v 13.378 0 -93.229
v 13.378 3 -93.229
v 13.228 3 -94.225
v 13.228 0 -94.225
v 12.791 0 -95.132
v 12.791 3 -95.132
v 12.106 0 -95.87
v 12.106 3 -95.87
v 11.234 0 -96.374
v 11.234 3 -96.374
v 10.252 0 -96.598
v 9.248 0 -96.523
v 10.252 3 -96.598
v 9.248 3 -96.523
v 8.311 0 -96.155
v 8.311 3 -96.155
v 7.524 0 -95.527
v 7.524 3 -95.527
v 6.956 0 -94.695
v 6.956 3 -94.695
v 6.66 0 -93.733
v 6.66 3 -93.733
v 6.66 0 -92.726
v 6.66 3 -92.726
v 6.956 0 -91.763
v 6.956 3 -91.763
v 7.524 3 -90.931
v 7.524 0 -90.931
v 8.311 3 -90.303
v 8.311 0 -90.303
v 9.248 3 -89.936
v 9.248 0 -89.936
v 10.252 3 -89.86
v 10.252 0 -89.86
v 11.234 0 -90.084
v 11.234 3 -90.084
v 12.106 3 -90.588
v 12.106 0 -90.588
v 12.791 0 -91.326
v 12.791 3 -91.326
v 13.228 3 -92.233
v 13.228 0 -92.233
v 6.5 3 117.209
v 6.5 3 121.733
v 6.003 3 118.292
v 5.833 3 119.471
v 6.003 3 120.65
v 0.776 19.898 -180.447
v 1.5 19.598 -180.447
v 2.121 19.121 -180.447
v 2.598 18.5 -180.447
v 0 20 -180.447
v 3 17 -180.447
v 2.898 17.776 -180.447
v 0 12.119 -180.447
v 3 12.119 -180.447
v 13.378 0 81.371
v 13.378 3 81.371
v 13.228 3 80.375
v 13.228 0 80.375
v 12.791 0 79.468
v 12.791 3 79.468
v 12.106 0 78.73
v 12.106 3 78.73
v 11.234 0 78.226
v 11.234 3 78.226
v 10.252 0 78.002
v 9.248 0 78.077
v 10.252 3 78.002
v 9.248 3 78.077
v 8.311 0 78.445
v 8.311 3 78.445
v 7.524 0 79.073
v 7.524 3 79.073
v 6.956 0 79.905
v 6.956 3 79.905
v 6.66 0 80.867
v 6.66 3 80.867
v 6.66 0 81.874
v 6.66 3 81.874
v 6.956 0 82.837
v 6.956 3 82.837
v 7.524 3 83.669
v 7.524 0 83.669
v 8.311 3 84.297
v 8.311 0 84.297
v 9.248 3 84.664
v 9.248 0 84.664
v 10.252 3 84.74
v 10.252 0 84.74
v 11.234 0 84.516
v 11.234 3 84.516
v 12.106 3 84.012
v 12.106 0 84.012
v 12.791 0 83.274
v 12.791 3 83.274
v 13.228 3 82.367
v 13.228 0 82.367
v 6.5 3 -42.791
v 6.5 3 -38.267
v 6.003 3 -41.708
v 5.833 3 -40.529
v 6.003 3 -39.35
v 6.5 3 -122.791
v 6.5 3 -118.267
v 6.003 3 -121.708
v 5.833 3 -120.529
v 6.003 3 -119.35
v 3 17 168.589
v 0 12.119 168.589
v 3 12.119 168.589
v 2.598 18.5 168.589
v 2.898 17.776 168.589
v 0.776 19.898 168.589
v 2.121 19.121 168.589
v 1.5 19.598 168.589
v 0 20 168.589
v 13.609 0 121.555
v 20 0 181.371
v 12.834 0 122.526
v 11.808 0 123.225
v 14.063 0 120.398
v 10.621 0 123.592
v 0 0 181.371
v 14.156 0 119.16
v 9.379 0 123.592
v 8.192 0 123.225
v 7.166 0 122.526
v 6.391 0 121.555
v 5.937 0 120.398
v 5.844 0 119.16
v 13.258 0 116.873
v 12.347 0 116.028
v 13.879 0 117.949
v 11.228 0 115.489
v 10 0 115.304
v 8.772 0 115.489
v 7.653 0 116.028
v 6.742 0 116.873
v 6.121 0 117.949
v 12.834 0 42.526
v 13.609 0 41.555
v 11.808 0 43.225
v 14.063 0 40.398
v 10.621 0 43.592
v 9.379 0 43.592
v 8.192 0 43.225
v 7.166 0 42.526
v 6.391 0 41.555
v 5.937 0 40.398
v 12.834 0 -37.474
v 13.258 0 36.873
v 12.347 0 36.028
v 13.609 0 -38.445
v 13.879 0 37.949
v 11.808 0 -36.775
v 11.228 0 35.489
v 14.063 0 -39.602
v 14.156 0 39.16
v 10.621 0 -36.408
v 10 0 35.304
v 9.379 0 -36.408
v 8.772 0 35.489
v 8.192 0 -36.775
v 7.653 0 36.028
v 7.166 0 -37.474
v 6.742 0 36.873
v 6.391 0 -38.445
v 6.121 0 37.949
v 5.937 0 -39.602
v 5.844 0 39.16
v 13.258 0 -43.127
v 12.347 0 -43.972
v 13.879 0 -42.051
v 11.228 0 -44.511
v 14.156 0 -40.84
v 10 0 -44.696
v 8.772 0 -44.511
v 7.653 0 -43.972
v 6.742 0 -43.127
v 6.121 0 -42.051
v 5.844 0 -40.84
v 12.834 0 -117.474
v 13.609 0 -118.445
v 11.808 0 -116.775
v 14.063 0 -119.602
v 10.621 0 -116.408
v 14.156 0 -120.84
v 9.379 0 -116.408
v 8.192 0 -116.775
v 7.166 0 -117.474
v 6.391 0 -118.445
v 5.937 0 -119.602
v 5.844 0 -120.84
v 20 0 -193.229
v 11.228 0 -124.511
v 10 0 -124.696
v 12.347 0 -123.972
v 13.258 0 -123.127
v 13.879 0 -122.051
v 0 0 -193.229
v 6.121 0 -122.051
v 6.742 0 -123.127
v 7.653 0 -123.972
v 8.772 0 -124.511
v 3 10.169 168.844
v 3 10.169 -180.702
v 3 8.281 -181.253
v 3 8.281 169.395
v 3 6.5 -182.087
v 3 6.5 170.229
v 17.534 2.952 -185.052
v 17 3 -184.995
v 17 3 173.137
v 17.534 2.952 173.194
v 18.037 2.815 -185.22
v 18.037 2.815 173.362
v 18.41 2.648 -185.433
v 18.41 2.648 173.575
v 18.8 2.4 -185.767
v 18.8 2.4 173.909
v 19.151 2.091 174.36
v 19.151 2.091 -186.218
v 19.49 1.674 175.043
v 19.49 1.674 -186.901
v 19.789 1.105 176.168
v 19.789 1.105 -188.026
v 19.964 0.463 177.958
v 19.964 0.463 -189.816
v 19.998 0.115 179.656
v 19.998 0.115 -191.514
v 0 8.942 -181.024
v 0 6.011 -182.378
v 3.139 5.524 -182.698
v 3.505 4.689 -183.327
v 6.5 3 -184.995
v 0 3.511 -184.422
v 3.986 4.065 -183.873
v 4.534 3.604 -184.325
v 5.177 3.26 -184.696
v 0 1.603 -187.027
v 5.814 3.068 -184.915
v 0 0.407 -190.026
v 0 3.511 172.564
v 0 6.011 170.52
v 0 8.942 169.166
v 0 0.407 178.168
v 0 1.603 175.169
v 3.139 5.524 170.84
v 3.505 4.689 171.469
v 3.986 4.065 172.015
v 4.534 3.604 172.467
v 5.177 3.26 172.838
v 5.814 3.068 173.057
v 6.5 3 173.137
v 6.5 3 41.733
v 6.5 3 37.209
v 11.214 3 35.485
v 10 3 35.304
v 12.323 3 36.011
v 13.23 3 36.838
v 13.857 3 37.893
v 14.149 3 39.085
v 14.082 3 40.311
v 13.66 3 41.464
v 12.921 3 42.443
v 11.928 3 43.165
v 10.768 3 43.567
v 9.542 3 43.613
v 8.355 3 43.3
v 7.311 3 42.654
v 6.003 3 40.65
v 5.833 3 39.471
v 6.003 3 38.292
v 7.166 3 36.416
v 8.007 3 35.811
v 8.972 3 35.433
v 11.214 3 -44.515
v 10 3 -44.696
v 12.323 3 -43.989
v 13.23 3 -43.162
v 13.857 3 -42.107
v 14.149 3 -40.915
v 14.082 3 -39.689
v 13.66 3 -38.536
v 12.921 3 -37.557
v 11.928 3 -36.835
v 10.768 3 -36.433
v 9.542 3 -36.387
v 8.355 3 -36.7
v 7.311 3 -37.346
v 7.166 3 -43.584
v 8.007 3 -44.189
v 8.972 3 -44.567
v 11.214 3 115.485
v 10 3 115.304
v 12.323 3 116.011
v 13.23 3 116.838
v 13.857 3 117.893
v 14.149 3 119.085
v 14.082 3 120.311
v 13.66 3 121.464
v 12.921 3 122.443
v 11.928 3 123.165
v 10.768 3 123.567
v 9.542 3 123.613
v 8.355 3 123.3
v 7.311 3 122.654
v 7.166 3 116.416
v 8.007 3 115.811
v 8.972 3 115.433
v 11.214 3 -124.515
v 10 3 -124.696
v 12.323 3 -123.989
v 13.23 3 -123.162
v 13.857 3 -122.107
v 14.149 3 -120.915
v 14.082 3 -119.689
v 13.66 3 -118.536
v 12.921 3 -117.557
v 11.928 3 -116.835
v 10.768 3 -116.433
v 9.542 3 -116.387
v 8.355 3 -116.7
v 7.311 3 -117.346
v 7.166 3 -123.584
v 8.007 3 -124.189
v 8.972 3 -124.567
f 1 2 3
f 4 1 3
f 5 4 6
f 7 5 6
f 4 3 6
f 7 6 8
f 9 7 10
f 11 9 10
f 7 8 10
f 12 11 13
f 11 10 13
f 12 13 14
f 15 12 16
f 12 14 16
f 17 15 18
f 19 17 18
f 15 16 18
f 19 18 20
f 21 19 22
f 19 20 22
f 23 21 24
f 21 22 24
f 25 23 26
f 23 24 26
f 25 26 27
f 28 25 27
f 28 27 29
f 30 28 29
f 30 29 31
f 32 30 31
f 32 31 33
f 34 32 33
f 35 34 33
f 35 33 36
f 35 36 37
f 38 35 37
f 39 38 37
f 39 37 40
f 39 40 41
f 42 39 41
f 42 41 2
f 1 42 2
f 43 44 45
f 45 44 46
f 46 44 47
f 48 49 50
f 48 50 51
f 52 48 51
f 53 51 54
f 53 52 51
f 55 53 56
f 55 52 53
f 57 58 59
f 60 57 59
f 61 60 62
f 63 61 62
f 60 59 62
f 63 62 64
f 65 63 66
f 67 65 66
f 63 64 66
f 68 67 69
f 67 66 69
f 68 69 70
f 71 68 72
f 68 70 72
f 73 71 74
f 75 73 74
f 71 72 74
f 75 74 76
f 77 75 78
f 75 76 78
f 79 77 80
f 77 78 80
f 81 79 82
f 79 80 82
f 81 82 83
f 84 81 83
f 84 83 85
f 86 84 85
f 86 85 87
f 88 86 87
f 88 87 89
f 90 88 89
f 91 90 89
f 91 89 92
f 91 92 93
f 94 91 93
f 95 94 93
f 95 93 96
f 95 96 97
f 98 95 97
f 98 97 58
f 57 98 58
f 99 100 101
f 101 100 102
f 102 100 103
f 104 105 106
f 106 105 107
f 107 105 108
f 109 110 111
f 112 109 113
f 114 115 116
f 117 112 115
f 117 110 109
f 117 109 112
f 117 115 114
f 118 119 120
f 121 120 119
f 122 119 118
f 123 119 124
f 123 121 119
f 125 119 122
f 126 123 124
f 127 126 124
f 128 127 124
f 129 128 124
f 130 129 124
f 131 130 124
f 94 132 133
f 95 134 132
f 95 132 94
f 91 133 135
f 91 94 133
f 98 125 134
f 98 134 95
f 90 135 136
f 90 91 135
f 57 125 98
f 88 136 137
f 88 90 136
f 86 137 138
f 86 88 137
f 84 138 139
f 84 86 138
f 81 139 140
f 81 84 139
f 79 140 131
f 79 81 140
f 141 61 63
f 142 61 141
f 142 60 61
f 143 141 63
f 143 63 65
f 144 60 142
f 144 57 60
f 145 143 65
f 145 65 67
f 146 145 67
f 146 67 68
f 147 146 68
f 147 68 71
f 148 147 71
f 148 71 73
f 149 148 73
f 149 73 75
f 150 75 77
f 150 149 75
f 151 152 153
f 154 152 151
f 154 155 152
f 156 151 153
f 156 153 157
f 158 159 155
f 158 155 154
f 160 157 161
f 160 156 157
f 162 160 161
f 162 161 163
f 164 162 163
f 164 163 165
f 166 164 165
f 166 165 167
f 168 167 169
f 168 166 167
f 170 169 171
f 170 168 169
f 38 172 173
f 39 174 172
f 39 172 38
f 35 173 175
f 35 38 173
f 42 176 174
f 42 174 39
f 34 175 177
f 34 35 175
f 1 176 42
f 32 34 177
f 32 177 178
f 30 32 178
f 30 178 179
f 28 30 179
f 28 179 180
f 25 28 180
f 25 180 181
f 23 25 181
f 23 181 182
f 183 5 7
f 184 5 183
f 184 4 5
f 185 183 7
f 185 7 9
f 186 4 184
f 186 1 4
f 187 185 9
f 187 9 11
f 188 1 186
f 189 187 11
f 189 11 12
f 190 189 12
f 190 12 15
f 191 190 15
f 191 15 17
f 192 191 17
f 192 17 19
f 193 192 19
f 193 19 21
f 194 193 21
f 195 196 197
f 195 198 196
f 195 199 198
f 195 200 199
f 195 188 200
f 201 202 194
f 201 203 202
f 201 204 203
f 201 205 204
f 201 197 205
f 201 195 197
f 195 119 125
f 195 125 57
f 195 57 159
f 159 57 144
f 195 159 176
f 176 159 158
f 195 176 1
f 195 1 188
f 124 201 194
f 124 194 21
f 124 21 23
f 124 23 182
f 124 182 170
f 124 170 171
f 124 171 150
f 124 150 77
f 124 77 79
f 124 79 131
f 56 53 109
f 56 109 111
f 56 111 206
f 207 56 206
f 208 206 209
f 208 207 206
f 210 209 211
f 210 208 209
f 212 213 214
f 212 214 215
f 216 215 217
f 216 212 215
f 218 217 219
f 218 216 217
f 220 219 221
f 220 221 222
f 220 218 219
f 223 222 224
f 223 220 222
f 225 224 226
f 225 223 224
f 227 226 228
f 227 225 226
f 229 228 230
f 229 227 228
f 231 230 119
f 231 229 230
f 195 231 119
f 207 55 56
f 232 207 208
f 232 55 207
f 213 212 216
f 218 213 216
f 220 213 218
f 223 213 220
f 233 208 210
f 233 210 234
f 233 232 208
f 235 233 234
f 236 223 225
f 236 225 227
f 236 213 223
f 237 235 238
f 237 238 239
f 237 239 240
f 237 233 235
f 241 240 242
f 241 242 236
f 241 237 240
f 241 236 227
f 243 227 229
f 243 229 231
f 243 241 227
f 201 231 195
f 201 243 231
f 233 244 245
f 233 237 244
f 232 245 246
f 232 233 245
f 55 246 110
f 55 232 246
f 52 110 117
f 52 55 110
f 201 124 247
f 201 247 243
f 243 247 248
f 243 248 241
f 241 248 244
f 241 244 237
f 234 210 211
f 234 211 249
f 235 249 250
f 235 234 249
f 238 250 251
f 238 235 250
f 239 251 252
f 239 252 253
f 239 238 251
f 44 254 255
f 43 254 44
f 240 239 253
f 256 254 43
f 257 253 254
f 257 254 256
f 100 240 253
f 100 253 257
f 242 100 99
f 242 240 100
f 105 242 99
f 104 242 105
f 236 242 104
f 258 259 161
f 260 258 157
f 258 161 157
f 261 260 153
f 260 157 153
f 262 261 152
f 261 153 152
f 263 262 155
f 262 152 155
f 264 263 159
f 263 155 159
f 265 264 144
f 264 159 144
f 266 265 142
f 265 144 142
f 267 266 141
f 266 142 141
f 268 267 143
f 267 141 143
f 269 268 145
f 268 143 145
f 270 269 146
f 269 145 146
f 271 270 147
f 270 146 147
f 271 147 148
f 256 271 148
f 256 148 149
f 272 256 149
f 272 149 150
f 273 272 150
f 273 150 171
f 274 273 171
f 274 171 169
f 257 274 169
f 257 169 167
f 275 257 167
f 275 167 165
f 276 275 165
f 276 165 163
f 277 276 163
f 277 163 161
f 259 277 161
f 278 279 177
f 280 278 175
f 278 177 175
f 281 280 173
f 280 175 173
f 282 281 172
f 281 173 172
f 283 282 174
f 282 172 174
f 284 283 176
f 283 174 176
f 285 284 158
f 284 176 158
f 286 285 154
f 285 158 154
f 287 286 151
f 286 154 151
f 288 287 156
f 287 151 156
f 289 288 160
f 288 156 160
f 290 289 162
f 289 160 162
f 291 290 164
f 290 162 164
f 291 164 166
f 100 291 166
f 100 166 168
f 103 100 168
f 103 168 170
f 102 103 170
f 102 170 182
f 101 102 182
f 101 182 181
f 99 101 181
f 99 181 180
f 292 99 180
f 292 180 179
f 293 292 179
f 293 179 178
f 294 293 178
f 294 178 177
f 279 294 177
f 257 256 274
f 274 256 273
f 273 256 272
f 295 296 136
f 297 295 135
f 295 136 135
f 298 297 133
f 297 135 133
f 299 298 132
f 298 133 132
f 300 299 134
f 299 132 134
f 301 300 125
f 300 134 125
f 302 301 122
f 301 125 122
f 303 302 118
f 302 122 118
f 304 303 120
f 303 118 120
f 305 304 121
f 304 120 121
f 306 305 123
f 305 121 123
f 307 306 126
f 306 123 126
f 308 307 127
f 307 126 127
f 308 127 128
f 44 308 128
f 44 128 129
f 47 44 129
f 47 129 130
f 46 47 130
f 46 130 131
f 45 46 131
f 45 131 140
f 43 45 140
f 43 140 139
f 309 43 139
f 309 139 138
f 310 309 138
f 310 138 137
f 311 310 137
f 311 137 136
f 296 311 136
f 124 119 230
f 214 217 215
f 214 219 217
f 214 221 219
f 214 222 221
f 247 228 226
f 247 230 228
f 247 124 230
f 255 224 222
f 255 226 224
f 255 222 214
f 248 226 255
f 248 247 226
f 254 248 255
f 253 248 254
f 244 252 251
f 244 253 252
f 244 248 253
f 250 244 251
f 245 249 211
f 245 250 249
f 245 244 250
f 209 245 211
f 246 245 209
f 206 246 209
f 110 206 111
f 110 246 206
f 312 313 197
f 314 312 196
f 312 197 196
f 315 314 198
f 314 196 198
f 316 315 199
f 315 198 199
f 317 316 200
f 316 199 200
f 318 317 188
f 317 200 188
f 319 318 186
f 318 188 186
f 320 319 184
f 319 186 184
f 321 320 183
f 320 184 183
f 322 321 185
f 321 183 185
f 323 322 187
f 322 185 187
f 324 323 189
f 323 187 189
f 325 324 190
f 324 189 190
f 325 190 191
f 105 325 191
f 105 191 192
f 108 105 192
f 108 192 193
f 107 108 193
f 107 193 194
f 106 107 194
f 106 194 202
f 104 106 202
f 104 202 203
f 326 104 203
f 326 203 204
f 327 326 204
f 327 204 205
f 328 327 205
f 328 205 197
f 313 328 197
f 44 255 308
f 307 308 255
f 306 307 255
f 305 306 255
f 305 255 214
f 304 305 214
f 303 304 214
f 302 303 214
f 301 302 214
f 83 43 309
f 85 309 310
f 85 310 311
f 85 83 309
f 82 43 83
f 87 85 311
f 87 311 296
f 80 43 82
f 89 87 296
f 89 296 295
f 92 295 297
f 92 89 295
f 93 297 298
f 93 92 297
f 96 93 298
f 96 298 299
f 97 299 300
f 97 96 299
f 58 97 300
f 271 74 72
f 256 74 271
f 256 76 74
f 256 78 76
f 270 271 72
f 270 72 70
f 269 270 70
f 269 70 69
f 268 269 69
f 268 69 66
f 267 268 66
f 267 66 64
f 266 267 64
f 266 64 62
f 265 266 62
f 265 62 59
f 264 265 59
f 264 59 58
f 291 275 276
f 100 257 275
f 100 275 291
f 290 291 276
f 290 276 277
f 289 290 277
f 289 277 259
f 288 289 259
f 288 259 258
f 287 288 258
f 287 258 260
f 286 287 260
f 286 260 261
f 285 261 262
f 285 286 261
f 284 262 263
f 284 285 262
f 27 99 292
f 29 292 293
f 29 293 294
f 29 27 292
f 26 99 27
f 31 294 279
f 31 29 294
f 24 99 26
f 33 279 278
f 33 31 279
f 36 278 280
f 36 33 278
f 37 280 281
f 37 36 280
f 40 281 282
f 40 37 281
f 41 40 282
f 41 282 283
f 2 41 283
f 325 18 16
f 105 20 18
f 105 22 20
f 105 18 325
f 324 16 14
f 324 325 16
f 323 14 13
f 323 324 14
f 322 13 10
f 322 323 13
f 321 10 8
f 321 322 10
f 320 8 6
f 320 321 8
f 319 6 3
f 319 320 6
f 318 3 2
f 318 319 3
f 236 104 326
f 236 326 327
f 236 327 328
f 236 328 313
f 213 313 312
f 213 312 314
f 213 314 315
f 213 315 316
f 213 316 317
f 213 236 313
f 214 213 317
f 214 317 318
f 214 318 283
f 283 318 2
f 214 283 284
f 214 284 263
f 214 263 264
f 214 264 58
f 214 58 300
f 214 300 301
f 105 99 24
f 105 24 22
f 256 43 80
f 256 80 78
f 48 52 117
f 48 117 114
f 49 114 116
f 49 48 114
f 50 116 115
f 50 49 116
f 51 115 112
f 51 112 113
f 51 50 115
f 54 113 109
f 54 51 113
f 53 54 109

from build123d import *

# Parameters (mm, degrees)
MIEMBRO_ESTRUCTURAL1_DEPTH    = 374.6
CORTAR_EXTRUIR2_DEPTH         = 196.288143284
TALADRO_DE_MARGEN_PARA_1_41_D = 6.7564
SKETCH2_R                     = 4.1671875
CUT_EXTRUDE2_DEPTH            = 3


with BuildPart() as part:
    # Sketch1 → Miembro estructural1 (new body)
    with BuildSketch(Plane.XY.offset(-193.229032258)):
        with BuildLine():
            Line((0, 0), (0, 20))
            ThreePointArc((0, 20), (2.121320344, 19.121320344), (3, 17))
            Line((3, 17), (3, 6.5))
            ThreePointArc((3, 6.5), (4.025126266, 4.025126266), (6.5, 3))
            Line((6.5, 3), (17, 3))
            ThreePointArc((17, 3), (19.121320344, 2.121320344), (20, 0))
            Line((20, 0), (0, 0))
        make_face()
    extrude(amount=MIEMBRO_ESTRUCTURAL1_DEPTH)

    # Croquis2 → Cortar-Extruir2 (cut, through all)
    with BuildSketch(Plane.YZ):
        with BuildLine():
            Line((12.119137035, 168.589088943), (20, 168.589088943))
            Line((20, 168.589088943), (20, 181.370967742))
            Line((20, 181.370967742), (0, 181.370967742))
            ThreePointArc((0, 181.370967742), (3.51143052, 172.56401157), (12.119137035, 168.589088943))
        make_face()
        with BuildLine():
            Line((22.851984592, -180.447153459), (12.119137035, -180.447153459))
            ThreePointArc((12.119137035, -180.447153459), (3.51143052, -184.422076086), (0, -193.229032258))
            Line((0, -193.229032258), (0, -196.975216041))
            Line((0, -196.975216041), (22.851984592, -196.975216041))
            Line((22.851984592, -196.975216041), (22.851984592, -180.447153459))
        make_face()
    extrude(amount=CORTAR_EXTRUIR2_DEPTH, mode=Mode.SUBTRACT)

    # Taladro de margen para 1/41 (through all)
    with Locations(Plane(origin=(0, 0, 0), x_dir=(-1, 0, 0), z_dir=(0, -1, 0))):
        with Locations((-10, -81.370967742), (-10, 93.229032258)):
            Hole(TALADRO_DE_MARGEN_PARA_1_41_D / 2)

    # Sketch2 → Cut-Extrude2 (cut)
    with BuildSketch(Plane.XZ):
        with Locations(Location((10, -40.529032258, 0), (0, 0, 270))):
            Circle(SKETCH2_R)
        with Locations(Location((10, 39.470967742, 0), (0, 0, 270))):
            Circle(SKETCH2_R)
        with Locations(Location((10, 119.470967742, 0), (0, 0, 270))):
            Circle(SKETCH2_R)
        with Locations(Location((10, -120.529032258, 0), (0, 0, 270))):
            Circle(SKETCH2_R)
    extrude(amount=-CUT_EXTRUDE2_DEPTH, mode=Mode.SUBTRACT)


solid = part.part
